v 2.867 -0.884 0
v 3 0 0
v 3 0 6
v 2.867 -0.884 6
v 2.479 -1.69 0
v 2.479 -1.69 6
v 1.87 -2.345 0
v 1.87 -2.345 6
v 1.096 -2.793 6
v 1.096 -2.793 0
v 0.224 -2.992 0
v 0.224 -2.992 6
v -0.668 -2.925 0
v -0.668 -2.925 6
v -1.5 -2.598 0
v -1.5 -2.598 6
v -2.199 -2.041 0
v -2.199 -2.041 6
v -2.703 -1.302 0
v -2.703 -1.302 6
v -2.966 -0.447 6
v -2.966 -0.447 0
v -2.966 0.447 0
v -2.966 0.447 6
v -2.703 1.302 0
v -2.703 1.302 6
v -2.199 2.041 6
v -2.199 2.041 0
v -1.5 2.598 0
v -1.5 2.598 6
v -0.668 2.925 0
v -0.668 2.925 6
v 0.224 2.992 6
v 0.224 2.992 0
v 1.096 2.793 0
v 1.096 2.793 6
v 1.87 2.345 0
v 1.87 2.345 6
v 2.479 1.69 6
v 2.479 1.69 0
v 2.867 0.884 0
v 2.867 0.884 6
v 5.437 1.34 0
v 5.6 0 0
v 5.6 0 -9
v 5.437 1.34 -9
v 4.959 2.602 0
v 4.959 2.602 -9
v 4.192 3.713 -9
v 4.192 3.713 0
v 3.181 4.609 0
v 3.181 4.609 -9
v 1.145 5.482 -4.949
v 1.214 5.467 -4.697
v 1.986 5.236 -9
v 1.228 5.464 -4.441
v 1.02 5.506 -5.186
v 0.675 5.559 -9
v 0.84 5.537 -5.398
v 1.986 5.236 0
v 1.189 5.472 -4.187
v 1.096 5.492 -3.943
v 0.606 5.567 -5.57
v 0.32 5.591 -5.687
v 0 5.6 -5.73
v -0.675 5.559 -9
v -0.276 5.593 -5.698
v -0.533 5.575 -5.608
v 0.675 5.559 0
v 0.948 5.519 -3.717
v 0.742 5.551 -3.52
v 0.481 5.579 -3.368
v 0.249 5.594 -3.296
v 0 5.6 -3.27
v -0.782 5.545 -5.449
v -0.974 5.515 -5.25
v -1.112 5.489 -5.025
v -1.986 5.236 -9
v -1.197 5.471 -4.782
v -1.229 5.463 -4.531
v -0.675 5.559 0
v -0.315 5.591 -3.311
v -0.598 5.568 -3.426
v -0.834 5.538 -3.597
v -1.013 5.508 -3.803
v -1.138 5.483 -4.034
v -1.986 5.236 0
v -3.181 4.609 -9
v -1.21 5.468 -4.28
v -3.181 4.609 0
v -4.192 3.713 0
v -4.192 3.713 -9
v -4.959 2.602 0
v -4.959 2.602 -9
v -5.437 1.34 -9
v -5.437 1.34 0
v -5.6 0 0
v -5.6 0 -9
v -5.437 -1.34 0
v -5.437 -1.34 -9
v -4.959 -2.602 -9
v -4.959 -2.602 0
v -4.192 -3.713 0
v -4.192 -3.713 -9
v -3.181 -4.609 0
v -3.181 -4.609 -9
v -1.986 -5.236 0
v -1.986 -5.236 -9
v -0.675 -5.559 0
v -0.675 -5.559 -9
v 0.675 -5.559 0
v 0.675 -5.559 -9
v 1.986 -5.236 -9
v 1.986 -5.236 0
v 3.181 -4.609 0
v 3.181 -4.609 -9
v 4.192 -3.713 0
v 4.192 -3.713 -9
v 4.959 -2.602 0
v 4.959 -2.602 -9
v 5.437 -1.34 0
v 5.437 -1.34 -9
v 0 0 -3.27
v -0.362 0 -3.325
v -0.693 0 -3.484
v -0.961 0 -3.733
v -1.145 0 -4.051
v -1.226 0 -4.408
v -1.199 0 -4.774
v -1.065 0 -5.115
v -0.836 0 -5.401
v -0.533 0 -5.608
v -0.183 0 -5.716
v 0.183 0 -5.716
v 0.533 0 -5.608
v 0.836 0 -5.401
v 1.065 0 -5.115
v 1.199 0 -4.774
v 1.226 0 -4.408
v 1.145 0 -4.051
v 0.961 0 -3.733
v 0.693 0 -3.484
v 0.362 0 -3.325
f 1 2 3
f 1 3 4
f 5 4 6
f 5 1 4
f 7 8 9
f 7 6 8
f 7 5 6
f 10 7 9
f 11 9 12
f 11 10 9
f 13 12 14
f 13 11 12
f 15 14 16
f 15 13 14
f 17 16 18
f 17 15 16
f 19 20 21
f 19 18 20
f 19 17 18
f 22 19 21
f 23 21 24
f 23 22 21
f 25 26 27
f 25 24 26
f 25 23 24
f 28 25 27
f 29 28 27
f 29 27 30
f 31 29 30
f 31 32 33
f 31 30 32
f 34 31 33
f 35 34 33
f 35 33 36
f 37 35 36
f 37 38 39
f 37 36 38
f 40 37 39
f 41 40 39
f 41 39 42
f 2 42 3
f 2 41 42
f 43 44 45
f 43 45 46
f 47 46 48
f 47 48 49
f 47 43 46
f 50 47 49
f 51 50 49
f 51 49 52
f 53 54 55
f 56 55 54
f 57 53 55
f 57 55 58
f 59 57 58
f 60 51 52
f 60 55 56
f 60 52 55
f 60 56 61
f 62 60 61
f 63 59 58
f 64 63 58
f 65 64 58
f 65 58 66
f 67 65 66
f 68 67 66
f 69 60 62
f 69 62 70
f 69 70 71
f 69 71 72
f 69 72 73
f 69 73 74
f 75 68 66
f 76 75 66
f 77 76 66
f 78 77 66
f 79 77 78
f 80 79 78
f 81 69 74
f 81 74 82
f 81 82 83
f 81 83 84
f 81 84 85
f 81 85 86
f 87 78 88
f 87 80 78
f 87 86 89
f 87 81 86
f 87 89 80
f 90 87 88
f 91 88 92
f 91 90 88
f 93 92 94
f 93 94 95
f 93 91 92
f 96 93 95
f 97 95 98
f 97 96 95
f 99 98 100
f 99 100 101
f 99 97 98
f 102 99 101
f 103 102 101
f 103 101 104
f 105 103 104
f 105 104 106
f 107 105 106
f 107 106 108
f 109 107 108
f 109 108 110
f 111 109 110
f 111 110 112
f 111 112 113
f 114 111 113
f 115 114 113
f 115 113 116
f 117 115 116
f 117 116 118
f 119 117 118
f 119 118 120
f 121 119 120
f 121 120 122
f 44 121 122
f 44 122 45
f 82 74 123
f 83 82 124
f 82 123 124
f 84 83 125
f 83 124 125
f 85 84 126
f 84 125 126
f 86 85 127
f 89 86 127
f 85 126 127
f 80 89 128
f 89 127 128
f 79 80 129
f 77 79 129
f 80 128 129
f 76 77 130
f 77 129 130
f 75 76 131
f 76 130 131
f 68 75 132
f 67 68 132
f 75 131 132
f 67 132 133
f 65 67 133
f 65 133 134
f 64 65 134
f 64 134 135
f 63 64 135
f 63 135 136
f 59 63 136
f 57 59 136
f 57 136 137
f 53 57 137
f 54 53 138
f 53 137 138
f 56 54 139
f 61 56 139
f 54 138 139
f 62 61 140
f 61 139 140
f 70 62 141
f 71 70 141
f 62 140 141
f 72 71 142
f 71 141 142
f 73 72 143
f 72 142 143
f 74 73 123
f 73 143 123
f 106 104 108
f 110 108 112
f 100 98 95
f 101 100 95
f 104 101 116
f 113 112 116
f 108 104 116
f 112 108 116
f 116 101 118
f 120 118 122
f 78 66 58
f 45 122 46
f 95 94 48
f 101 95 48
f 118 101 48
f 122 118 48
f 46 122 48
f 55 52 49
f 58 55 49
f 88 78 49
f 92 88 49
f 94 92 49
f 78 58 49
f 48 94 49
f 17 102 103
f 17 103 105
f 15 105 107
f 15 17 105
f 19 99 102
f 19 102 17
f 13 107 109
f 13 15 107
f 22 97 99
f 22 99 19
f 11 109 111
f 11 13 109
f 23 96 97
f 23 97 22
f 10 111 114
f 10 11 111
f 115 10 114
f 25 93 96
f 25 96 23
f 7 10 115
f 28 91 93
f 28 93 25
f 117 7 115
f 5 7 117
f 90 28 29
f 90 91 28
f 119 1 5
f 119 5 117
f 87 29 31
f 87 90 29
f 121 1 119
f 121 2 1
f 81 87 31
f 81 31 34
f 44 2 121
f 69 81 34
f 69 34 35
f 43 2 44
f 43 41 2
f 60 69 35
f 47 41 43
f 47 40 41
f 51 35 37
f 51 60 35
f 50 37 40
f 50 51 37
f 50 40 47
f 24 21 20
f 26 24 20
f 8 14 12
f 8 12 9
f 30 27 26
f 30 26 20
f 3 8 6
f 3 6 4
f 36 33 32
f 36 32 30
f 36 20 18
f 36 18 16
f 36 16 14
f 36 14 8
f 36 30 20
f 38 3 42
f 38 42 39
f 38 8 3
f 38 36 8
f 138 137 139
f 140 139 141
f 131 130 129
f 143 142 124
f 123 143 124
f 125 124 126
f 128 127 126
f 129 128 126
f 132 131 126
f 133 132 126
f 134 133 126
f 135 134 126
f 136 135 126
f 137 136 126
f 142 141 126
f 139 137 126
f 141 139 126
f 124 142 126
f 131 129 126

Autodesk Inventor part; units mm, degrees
ref_plane "YZ Plane" through (0, 0, 0) normal (1, 0, 0) x (0, 1, 0)
ref_plane "XZ Plane" through (0, 0, 0) normal (0, 1, 0) x (-1, 0, 0)
sketch "Sketch1" plane through (0, 0, 0) normal (0, 0, 1) x (1, 0, 0)
  circle A0 centre (0, 0) radius 5.6
  dimension "d0" = 11.2
extrude "Extrusion1" add sketch "Sketch1" against normal blind 9
ref_plane "Work Plane1" through (-5.6, 5.6, 0) normal (0, 1, 0) x (1, 0, 0)
sketch "Sketch3" plane through (-5.6, 5.6, 0) normal (0, 1, 0) x (1, 0, 0)
  circle A0 centre (5.6, 4.5) radius 1.2
  point P0 (5.6, 0)
  dimension "d9" = 2.4
hole "Hole1" at (0, 5.6, -4.5) direction (0, -1, 0) diameter 2.459 depth 5.6 thread size "M3x0.5" designation "M3" class "6H" standard "GB Metric profile"
sketch "Sketch4" plane through (0, 0, 0) normal (0, 0, 1) x (1, 0, 0)
  circle A0 centre (0, 0) radius 5.6 projected
  circle A1 centre (0, 0) radius 3
  dimension "d17" = 6
extrude "Extrusion3" add sketch "Sketch4" along normal blind 6 contours A1
properties part number "gear motor"
